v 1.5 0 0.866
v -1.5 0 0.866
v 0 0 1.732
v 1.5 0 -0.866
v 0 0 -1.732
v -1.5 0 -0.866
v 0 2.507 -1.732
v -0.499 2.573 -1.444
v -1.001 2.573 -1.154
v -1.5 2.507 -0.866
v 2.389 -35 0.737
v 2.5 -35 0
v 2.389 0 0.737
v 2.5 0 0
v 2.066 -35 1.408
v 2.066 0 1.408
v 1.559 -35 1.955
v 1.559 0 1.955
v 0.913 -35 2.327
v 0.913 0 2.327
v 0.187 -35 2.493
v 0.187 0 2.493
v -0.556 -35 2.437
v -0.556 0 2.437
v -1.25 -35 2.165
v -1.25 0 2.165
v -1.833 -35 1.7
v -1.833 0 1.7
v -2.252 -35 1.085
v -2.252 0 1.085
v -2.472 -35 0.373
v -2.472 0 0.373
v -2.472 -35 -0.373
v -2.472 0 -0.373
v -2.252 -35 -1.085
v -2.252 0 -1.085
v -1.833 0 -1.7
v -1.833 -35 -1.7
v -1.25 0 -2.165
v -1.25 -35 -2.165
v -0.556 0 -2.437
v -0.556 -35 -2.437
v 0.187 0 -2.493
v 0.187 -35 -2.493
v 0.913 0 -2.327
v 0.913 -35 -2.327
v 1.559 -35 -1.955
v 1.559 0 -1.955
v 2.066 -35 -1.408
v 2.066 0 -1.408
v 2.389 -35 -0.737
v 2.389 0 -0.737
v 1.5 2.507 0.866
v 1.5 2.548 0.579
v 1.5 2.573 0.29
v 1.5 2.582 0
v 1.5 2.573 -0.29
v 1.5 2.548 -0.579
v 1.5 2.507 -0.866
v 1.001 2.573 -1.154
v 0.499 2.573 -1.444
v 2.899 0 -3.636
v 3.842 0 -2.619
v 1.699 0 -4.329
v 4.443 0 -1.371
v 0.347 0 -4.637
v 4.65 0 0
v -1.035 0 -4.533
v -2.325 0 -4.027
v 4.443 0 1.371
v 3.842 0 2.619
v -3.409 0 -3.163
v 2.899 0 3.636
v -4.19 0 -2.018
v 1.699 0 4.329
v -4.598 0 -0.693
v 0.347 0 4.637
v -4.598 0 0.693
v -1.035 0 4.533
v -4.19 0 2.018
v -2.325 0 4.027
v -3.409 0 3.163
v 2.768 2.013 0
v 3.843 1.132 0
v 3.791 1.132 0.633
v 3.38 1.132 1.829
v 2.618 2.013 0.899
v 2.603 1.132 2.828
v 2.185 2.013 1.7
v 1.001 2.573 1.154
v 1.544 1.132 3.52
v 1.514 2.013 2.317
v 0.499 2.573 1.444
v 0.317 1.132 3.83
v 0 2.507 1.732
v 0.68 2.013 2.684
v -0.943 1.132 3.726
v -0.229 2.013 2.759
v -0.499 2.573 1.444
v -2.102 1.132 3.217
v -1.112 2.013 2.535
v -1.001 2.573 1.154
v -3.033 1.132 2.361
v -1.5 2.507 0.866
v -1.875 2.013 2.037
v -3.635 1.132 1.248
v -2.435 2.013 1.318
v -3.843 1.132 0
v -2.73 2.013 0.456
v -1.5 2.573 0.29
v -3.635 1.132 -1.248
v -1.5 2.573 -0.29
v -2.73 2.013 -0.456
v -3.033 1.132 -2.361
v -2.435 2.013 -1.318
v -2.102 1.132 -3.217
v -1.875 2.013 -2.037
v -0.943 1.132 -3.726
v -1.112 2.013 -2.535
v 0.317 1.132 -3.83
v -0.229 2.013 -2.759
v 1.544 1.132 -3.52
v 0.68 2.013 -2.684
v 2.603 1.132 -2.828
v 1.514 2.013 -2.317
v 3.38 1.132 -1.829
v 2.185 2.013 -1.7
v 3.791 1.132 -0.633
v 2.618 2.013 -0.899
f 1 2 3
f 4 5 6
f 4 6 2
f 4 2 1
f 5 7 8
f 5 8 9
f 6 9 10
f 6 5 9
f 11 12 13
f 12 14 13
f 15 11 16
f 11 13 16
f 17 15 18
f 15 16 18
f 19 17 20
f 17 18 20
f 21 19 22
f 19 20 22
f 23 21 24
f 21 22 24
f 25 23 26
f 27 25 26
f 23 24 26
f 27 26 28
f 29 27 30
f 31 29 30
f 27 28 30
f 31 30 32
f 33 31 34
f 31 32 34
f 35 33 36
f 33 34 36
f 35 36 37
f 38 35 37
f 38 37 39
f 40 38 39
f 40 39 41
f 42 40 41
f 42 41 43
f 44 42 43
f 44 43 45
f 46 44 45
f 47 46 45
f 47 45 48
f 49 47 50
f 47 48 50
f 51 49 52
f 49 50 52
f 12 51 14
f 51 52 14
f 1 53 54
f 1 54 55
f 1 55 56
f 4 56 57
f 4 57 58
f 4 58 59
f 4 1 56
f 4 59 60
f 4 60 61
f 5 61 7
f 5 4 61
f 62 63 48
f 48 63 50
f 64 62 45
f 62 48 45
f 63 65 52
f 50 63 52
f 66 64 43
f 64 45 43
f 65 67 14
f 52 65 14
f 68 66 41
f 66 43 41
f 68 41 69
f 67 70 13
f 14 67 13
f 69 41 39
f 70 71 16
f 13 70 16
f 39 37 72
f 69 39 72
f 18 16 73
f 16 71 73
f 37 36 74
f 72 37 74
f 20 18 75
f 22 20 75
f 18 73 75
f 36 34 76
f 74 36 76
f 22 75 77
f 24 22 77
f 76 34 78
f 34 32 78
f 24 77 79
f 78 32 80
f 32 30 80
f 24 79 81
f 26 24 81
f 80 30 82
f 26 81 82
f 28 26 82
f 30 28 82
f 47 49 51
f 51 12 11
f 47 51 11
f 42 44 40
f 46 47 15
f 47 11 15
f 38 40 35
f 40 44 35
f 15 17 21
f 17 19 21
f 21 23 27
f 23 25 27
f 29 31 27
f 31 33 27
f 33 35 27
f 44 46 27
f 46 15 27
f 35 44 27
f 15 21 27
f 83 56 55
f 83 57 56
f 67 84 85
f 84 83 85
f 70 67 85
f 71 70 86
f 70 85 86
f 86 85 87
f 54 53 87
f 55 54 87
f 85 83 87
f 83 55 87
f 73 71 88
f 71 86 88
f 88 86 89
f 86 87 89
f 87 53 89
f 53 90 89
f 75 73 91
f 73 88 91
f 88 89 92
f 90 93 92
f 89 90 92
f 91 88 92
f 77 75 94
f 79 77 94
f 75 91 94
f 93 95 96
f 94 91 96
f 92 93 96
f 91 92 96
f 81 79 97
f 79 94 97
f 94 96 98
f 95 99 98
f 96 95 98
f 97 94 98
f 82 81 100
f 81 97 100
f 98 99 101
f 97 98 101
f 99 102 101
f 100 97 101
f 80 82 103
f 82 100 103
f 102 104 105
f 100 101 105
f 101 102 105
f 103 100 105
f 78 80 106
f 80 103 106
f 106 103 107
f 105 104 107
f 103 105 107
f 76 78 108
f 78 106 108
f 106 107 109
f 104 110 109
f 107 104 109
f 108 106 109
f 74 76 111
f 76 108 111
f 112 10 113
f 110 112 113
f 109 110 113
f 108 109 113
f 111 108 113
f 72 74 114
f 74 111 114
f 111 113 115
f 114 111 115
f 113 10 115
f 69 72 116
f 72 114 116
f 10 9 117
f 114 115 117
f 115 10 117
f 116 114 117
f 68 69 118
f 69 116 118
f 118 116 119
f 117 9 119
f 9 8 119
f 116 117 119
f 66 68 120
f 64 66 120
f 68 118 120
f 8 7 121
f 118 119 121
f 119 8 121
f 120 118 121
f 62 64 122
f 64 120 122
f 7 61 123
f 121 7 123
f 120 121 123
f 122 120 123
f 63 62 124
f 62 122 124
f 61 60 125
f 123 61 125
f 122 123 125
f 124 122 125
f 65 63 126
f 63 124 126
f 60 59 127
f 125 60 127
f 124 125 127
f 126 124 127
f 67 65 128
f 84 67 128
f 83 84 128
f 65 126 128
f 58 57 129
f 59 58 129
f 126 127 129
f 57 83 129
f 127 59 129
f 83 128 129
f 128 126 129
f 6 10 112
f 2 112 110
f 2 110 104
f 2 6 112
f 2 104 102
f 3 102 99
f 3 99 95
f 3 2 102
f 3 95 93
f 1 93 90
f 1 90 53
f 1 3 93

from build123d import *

# Parameters (mm, degrees)
CUT_EXTRUDE1_DEPTH = 10


with BuildPart() as part:
    # Sketch1 → Revolve1 (revolve)
    with BuildSketch(Plane.XY):
        with BuildLine():
            Line((0, 0), (0, -35))
            Line((0, -35), (2.5, -35))
            Line((2.5, -35), (2.5, 0))
            Line((2.5, 0), (4.65, 0))
            ThreePointArc((4.65, 0), (2.713968497, 2.045965539), (0, 2.8))
            Line((0, 2.8), (0, 0))
        make_face()
    revolve(axis=Axis((0, 0, 0), (0, -1, 0)))

    # Sketch2 → Cut-Extrude1 (cut)
    with BuildSketch(Plane(origin=(0, 0, 0), x_dir=(1, 0, 0), z_dir=(0, 1, 0))):
        Polygon((0, 1.732050808), (-1.5, 0.866025404), (-1.5, -0.866025404), (0, -1.732050808), (1.5, -0.866025404), (1.5, 0.866025404), align=None)
    extrude(amount=CUT_EXTRUDE1_DEPTH, mode=Mode.SUBTRACT)


solid = part.part
